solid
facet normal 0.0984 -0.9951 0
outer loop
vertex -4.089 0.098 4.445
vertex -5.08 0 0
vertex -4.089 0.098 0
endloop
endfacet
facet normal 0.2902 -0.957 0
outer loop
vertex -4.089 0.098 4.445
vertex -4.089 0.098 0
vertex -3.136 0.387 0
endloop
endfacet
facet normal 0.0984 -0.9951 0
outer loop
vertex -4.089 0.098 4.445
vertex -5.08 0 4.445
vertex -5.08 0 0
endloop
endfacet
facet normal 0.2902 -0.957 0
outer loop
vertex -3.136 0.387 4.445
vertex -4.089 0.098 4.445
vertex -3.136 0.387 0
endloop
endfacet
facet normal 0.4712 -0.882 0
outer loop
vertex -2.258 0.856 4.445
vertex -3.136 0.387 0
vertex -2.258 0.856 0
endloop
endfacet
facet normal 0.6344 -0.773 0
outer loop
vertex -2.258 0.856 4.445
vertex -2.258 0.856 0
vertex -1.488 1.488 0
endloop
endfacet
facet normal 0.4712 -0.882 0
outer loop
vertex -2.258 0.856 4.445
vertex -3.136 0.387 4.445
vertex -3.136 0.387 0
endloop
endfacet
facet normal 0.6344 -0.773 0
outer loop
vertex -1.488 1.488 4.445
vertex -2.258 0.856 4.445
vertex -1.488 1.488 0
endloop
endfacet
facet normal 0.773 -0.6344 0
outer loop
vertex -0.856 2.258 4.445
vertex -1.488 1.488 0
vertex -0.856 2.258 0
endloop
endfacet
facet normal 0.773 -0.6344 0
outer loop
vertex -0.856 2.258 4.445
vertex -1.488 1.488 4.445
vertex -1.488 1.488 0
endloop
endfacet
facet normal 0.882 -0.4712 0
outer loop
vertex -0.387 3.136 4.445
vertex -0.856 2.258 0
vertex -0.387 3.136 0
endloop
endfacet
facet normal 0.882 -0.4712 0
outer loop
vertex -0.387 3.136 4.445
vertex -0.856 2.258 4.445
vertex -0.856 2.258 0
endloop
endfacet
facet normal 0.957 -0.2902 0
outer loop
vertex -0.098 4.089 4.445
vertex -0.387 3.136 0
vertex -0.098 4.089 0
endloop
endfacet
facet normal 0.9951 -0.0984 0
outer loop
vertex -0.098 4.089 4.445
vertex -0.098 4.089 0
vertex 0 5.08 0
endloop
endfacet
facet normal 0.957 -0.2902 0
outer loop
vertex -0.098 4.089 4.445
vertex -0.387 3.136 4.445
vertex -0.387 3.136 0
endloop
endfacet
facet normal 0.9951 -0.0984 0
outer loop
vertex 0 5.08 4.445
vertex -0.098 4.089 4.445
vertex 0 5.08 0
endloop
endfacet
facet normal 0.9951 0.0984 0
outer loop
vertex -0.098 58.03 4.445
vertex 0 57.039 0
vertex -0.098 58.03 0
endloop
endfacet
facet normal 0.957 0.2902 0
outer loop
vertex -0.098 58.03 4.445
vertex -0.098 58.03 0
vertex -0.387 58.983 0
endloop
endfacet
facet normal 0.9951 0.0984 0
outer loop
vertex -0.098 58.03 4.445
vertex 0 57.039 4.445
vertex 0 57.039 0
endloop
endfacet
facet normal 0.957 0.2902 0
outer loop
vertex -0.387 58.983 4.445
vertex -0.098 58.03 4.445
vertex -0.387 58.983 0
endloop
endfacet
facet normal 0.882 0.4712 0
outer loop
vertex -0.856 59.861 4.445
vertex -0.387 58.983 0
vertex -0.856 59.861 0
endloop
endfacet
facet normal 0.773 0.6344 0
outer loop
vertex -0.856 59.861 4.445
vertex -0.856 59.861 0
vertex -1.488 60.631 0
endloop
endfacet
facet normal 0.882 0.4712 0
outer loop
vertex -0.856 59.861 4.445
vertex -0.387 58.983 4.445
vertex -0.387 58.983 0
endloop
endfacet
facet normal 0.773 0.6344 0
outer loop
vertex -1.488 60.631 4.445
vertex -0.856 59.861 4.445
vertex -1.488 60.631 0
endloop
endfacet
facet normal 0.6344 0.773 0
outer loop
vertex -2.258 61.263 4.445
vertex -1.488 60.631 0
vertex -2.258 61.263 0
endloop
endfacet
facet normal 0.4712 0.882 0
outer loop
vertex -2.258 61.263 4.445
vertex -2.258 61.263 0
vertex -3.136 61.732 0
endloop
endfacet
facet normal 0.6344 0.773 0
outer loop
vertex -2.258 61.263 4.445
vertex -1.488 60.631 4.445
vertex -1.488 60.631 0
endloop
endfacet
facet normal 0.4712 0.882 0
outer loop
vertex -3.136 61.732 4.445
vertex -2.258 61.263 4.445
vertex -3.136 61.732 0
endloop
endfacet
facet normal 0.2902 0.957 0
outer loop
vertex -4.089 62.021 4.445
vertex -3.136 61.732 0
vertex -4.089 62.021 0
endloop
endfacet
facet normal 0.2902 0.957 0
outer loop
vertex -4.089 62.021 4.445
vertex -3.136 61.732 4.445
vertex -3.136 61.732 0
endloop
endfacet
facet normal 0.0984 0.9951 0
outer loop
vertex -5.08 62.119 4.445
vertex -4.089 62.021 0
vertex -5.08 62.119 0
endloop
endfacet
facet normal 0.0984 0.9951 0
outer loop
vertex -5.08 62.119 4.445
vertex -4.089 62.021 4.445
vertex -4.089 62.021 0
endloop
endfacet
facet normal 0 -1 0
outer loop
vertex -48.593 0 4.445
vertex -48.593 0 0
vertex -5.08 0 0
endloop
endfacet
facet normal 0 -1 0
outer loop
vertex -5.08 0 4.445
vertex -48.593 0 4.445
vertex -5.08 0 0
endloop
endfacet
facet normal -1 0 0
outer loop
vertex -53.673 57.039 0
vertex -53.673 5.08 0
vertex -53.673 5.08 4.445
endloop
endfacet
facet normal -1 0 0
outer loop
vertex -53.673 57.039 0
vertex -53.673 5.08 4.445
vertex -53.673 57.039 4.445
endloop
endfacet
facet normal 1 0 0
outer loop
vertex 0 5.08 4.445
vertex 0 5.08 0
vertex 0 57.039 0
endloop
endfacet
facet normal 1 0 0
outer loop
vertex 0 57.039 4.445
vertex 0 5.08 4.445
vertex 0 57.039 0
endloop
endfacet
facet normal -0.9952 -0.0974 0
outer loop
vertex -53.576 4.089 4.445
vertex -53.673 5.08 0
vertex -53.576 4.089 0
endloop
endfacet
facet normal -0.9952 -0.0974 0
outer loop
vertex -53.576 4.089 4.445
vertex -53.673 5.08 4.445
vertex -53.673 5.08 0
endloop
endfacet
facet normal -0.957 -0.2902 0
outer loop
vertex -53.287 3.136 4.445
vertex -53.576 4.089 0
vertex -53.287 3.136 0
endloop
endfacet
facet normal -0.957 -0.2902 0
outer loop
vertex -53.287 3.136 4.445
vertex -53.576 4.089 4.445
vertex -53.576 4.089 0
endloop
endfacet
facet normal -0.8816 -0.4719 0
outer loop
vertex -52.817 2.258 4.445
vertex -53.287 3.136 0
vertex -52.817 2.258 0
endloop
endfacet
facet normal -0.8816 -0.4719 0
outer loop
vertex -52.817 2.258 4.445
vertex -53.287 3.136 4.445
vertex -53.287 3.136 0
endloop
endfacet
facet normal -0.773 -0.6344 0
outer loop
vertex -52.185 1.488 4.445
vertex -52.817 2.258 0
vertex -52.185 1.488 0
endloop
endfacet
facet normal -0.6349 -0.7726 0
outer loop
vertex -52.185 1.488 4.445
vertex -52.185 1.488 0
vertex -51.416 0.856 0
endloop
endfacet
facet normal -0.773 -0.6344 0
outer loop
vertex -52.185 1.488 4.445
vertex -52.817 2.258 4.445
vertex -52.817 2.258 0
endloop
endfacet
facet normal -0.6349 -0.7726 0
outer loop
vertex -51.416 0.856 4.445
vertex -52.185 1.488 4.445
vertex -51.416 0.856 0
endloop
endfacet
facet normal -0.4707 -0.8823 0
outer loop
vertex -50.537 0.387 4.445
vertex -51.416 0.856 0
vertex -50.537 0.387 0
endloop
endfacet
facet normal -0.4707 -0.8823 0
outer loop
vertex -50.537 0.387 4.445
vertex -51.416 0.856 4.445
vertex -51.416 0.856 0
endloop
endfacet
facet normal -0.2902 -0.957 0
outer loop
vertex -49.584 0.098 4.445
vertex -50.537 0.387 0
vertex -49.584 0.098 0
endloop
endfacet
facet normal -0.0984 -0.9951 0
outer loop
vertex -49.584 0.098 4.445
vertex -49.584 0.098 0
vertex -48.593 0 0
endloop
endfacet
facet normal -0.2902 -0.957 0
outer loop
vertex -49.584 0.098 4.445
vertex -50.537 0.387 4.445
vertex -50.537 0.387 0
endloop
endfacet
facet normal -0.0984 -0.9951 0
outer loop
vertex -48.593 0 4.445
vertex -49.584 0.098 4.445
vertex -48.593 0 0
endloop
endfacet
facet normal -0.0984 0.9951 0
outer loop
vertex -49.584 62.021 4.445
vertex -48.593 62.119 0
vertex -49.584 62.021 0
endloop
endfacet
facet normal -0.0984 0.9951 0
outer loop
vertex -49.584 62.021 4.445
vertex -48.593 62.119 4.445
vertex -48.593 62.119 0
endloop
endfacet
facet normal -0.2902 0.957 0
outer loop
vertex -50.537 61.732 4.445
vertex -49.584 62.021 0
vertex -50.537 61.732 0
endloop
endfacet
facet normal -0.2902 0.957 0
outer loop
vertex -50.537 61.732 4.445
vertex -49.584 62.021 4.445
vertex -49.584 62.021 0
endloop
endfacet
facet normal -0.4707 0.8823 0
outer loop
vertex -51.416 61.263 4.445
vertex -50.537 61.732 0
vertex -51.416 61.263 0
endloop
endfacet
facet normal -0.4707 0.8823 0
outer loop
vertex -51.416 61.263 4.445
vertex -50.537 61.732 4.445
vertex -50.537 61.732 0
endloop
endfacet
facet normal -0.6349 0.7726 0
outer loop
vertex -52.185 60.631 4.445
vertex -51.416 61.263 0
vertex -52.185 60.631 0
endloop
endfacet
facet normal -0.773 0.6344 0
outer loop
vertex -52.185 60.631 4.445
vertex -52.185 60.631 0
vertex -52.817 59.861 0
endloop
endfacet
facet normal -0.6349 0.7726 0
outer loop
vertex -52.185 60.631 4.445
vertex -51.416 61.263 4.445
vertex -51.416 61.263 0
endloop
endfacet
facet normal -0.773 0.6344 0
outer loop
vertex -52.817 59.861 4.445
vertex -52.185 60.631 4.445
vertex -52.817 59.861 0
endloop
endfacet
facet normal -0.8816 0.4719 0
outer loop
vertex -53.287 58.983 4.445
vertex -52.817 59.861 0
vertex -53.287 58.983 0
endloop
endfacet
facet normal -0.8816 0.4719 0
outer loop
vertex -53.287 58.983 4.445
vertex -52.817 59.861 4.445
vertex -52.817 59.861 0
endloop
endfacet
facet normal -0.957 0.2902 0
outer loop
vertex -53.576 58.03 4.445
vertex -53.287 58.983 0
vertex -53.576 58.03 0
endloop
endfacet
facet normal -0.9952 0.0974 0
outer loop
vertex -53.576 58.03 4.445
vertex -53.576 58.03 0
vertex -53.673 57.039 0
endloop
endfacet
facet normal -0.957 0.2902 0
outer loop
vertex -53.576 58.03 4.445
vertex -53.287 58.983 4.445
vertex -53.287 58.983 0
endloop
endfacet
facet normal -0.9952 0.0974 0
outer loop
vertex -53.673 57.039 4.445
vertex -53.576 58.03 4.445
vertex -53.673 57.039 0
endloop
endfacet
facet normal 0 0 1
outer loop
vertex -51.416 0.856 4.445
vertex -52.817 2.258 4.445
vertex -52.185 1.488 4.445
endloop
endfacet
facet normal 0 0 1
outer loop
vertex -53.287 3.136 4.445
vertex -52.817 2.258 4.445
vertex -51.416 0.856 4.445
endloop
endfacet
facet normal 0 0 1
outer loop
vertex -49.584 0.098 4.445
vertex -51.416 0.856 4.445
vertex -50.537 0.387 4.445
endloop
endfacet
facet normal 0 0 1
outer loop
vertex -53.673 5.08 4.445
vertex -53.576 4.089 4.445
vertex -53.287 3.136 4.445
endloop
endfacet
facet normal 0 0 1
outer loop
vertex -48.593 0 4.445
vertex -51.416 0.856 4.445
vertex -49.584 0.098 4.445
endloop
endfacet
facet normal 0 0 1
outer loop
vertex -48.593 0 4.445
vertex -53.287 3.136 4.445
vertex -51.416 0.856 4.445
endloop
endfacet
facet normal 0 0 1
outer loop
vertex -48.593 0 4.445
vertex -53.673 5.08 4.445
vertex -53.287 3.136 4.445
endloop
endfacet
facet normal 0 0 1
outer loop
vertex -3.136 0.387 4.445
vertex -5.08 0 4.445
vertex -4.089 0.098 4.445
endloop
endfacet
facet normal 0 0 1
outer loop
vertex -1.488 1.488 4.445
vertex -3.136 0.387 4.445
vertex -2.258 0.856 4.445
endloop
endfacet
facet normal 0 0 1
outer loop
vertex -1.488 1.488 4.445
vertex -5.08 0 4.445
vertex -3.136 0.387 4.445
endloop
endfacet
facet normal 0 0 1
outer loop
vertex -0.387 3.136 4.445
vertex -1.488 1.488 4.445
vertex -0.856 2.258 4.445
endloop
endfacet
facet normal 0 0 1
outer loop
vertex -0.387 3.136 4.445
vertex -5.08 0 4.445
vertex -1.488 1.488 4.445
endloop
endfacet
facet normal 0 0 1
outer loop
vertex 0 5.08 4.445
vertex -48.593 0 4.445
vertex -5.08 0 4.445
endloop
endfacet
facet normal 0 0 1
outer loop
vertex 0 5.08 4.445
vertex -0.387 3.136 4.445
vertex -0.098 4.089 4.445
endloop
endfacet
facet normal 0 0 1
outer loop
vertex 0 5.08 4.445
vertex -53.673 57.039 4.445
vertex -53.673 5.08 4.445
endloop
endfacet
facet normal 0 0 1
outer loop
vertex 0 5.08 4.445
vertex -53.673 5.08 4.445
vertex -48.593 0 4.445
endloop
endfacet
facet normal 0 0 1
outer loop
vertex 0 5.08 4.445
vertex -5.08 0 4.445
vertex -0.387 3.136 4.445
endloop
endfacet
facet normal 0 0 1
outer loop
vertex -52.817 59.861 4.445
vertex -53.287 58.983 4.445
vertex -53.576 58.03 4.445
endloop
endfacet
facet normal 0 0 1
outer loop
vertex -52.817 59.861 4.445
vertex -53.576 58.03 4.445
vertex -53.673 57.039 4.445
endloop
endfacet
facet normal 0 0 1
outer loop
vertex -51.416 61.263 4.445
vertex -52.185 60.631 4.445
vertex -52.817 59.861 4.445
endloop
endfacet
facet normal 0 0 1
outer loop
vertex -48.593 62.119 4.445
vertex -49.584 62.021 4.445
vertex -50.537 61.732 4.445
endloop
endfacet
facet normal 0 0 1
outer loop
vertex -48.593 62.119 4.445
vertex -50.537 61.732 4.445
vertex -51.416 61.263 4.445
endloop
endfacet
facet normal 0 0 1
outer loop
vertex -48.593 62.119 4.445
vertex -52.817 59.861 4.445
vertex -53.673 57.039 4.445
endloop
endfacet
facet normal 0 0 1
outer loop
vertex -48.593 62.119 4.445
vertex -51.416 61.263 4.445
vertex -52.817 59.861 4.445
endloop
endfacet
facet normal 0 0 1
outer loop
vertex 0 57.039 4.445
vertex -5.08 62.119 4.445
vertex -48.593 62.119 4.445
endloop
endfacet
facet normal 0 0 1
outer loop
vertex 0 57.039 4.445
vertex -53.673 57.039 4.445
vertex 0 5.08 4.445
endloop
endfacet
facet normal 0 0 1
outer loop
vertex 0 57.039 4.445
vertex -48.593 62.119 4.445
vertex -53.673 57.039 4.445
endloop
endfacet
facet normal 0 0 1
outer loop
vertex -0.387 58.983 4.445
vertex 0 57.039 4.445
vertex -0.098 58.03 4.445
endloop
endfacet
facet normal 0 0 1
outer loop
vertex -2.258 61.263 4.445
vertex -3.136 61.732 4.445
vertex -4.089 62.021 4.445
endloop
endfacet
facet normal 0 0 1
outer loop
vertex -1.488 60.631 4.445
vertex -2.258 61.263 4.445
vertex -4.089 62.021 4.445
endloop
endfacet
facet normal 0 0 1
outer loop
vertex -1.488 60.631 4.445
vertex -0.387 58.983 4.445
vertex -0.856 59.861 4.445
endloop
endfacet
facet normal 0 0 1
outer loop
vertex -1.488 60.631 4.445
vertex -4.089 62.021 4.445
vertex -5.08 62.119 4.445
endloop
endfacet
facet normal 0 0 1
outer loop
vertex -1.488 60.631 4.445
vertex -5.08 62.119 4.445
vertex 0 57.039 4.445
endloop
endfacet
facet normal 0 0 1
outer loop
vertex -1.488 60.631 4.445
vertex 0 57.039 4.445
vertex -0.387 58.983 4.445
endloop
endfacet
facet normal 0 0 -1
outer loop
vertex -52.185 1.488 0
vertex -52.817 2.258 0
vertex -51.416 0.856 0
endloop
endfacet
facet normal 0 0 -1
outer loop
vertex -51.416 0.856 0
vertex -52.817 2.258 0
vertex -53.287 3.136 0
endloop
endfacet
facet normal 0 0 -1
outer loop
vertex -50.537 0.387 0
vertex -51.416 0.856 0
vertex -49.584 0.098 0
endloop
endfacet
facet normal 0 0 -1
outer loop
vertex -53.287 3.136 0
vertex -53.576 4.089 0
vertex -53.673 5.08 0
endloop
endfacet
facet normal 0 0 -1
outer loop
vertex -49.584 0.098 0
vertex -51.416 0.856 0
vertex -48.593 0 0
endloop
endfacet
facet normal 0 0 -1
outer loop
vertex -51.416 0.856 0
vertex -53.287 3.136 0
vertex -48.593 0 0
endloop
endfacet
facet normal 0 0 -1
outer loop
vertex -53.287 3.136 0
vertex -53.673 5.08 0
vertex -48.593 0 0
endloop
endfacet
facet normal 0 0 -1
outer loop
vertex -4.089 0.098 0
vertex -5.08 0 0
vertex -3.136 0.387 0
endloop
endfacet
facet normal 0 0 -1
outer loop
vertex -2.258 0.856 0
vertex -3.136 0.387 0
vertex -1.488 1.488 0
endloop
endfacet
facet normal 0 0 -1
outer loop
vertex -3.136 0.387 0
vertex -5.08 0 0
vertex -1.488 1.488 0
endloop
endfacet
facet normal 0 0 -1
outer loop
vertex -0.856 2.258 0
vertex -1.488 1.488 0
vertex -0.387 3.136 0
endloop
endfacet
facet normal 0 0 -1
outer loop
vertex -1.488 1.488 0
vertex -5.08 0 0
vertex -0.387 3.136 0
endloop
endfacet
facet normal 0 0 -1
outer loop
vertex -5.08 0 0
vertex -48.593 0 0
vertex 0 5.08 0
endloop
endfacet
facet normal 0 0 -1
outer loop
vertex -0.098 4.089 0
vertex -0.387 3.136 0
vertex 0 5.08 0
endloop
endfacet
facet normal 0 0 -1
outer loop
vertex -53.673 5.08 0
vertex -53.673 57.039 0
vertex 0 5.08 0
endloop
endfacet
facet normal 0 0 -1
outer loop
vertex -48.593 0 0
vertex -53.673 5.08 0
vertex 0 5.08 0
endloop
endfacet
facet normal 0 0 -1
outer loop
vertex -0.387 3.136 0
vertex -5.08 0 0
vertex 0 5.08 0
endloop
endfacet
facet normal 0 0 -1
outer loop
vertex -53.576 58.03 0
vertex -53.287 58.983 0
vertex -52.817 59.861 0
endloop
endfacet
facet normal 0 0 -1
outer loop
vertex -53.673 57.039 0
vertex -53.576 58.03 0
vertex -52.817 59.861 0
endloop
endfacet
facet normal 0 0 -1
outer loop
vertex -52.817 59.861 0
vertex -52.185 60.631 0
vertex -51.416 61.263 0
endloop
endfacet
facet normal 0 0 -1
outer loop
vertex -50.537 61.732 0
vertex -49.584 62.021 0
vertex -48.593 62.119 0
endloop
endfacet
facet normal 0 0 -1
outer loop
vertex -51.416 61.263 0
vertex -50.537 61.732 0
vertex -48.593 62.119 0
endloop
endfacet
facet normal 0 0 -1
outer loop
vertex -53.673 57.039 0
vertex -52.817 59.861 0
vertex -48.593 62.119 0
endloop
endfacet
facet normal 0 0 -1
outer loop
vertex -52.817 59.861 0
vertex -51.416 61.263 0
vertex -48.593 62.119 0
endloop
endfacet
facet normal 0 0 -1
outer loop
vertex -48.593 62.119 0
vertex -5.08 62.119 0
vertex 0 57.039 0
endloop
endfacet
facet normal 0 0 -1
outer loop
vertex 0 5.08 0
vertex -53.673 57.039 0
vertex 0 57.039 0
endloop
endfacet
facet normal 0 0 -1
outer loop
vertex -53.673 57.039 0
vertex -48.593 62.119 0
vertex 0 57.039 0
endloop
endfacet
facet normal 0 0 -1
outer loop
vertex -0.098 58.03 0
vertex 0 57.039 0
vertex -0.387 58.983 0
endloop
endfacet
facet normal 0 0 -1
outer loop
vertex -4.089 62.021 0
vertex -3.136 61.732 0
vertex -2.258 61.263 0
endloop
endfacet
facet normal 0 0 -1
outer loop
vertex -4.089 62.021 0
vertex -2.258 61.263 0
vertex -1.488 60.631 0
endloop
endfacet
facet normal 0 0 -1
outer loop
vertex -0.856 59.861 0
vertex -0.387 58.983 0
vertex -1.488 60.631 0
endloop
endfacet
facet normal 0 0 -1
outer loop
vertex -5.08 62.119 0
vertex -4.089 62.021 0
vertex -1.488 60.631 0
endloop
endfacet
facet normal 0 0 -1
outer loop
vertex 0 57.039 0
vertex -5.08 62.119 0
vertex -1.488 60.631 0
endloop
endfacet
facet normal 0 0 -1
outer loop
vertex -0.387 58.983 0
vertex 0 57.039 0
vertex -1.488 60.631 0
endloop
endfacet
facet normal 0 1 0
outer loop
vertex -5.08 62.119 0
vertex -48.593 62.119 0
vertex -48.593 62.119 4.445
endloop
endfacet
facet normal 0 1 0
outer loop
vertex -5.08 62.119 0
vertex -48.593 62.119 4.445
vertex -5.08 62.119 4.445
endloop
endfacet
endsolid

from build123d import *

# Parameters (mm, degrees)
F0_W     = 53.673375
F0_H     = 62.118877
F1_DEPTH = 4.445
F2_R     = 5.08
F3_R     = 5.08
F4_R     = 5.08
F5_R     = 5.08


with BuildPart() as f1:
    # F0 (on Top) → F1 (new body)
    with BuildSketch(Plane.XY):
        with Locations((-26.836688, 31.059438)):
            Rectangle(F0_W, F0_H)
    extrude(amount=F1_DEPTH)

    # F2
    f2_edges = [f1.edges().sort_by_distance(p)[0] for p in [
        (0, 62.118877, 2.2225),
    ]]
    fillet(f2_edges, radius=F2_R)

    # F3
    f3_edges = [f1.edges().sort_by_distance(p)[0] for p in [
        (-53.673375, 62.118877, 2.2225),
    ]]
    fillet(f3_edges, radius=F3_R)

    # F4
    f4_edges = [f1.edges().sort_by_distance(p)[0] for p in [
        (-53.673375, 0, 2.2225),
    ]]
    fillet(f4_edges, radius=F4_R)

    # F5
    f5_edges = [f1.edges().sort_by_distance(p)[0] for p in [
        (0, 0, 2.2225),
    ]]
    fillet(f5_edges, radius=F5_R)


solid = f1.part
